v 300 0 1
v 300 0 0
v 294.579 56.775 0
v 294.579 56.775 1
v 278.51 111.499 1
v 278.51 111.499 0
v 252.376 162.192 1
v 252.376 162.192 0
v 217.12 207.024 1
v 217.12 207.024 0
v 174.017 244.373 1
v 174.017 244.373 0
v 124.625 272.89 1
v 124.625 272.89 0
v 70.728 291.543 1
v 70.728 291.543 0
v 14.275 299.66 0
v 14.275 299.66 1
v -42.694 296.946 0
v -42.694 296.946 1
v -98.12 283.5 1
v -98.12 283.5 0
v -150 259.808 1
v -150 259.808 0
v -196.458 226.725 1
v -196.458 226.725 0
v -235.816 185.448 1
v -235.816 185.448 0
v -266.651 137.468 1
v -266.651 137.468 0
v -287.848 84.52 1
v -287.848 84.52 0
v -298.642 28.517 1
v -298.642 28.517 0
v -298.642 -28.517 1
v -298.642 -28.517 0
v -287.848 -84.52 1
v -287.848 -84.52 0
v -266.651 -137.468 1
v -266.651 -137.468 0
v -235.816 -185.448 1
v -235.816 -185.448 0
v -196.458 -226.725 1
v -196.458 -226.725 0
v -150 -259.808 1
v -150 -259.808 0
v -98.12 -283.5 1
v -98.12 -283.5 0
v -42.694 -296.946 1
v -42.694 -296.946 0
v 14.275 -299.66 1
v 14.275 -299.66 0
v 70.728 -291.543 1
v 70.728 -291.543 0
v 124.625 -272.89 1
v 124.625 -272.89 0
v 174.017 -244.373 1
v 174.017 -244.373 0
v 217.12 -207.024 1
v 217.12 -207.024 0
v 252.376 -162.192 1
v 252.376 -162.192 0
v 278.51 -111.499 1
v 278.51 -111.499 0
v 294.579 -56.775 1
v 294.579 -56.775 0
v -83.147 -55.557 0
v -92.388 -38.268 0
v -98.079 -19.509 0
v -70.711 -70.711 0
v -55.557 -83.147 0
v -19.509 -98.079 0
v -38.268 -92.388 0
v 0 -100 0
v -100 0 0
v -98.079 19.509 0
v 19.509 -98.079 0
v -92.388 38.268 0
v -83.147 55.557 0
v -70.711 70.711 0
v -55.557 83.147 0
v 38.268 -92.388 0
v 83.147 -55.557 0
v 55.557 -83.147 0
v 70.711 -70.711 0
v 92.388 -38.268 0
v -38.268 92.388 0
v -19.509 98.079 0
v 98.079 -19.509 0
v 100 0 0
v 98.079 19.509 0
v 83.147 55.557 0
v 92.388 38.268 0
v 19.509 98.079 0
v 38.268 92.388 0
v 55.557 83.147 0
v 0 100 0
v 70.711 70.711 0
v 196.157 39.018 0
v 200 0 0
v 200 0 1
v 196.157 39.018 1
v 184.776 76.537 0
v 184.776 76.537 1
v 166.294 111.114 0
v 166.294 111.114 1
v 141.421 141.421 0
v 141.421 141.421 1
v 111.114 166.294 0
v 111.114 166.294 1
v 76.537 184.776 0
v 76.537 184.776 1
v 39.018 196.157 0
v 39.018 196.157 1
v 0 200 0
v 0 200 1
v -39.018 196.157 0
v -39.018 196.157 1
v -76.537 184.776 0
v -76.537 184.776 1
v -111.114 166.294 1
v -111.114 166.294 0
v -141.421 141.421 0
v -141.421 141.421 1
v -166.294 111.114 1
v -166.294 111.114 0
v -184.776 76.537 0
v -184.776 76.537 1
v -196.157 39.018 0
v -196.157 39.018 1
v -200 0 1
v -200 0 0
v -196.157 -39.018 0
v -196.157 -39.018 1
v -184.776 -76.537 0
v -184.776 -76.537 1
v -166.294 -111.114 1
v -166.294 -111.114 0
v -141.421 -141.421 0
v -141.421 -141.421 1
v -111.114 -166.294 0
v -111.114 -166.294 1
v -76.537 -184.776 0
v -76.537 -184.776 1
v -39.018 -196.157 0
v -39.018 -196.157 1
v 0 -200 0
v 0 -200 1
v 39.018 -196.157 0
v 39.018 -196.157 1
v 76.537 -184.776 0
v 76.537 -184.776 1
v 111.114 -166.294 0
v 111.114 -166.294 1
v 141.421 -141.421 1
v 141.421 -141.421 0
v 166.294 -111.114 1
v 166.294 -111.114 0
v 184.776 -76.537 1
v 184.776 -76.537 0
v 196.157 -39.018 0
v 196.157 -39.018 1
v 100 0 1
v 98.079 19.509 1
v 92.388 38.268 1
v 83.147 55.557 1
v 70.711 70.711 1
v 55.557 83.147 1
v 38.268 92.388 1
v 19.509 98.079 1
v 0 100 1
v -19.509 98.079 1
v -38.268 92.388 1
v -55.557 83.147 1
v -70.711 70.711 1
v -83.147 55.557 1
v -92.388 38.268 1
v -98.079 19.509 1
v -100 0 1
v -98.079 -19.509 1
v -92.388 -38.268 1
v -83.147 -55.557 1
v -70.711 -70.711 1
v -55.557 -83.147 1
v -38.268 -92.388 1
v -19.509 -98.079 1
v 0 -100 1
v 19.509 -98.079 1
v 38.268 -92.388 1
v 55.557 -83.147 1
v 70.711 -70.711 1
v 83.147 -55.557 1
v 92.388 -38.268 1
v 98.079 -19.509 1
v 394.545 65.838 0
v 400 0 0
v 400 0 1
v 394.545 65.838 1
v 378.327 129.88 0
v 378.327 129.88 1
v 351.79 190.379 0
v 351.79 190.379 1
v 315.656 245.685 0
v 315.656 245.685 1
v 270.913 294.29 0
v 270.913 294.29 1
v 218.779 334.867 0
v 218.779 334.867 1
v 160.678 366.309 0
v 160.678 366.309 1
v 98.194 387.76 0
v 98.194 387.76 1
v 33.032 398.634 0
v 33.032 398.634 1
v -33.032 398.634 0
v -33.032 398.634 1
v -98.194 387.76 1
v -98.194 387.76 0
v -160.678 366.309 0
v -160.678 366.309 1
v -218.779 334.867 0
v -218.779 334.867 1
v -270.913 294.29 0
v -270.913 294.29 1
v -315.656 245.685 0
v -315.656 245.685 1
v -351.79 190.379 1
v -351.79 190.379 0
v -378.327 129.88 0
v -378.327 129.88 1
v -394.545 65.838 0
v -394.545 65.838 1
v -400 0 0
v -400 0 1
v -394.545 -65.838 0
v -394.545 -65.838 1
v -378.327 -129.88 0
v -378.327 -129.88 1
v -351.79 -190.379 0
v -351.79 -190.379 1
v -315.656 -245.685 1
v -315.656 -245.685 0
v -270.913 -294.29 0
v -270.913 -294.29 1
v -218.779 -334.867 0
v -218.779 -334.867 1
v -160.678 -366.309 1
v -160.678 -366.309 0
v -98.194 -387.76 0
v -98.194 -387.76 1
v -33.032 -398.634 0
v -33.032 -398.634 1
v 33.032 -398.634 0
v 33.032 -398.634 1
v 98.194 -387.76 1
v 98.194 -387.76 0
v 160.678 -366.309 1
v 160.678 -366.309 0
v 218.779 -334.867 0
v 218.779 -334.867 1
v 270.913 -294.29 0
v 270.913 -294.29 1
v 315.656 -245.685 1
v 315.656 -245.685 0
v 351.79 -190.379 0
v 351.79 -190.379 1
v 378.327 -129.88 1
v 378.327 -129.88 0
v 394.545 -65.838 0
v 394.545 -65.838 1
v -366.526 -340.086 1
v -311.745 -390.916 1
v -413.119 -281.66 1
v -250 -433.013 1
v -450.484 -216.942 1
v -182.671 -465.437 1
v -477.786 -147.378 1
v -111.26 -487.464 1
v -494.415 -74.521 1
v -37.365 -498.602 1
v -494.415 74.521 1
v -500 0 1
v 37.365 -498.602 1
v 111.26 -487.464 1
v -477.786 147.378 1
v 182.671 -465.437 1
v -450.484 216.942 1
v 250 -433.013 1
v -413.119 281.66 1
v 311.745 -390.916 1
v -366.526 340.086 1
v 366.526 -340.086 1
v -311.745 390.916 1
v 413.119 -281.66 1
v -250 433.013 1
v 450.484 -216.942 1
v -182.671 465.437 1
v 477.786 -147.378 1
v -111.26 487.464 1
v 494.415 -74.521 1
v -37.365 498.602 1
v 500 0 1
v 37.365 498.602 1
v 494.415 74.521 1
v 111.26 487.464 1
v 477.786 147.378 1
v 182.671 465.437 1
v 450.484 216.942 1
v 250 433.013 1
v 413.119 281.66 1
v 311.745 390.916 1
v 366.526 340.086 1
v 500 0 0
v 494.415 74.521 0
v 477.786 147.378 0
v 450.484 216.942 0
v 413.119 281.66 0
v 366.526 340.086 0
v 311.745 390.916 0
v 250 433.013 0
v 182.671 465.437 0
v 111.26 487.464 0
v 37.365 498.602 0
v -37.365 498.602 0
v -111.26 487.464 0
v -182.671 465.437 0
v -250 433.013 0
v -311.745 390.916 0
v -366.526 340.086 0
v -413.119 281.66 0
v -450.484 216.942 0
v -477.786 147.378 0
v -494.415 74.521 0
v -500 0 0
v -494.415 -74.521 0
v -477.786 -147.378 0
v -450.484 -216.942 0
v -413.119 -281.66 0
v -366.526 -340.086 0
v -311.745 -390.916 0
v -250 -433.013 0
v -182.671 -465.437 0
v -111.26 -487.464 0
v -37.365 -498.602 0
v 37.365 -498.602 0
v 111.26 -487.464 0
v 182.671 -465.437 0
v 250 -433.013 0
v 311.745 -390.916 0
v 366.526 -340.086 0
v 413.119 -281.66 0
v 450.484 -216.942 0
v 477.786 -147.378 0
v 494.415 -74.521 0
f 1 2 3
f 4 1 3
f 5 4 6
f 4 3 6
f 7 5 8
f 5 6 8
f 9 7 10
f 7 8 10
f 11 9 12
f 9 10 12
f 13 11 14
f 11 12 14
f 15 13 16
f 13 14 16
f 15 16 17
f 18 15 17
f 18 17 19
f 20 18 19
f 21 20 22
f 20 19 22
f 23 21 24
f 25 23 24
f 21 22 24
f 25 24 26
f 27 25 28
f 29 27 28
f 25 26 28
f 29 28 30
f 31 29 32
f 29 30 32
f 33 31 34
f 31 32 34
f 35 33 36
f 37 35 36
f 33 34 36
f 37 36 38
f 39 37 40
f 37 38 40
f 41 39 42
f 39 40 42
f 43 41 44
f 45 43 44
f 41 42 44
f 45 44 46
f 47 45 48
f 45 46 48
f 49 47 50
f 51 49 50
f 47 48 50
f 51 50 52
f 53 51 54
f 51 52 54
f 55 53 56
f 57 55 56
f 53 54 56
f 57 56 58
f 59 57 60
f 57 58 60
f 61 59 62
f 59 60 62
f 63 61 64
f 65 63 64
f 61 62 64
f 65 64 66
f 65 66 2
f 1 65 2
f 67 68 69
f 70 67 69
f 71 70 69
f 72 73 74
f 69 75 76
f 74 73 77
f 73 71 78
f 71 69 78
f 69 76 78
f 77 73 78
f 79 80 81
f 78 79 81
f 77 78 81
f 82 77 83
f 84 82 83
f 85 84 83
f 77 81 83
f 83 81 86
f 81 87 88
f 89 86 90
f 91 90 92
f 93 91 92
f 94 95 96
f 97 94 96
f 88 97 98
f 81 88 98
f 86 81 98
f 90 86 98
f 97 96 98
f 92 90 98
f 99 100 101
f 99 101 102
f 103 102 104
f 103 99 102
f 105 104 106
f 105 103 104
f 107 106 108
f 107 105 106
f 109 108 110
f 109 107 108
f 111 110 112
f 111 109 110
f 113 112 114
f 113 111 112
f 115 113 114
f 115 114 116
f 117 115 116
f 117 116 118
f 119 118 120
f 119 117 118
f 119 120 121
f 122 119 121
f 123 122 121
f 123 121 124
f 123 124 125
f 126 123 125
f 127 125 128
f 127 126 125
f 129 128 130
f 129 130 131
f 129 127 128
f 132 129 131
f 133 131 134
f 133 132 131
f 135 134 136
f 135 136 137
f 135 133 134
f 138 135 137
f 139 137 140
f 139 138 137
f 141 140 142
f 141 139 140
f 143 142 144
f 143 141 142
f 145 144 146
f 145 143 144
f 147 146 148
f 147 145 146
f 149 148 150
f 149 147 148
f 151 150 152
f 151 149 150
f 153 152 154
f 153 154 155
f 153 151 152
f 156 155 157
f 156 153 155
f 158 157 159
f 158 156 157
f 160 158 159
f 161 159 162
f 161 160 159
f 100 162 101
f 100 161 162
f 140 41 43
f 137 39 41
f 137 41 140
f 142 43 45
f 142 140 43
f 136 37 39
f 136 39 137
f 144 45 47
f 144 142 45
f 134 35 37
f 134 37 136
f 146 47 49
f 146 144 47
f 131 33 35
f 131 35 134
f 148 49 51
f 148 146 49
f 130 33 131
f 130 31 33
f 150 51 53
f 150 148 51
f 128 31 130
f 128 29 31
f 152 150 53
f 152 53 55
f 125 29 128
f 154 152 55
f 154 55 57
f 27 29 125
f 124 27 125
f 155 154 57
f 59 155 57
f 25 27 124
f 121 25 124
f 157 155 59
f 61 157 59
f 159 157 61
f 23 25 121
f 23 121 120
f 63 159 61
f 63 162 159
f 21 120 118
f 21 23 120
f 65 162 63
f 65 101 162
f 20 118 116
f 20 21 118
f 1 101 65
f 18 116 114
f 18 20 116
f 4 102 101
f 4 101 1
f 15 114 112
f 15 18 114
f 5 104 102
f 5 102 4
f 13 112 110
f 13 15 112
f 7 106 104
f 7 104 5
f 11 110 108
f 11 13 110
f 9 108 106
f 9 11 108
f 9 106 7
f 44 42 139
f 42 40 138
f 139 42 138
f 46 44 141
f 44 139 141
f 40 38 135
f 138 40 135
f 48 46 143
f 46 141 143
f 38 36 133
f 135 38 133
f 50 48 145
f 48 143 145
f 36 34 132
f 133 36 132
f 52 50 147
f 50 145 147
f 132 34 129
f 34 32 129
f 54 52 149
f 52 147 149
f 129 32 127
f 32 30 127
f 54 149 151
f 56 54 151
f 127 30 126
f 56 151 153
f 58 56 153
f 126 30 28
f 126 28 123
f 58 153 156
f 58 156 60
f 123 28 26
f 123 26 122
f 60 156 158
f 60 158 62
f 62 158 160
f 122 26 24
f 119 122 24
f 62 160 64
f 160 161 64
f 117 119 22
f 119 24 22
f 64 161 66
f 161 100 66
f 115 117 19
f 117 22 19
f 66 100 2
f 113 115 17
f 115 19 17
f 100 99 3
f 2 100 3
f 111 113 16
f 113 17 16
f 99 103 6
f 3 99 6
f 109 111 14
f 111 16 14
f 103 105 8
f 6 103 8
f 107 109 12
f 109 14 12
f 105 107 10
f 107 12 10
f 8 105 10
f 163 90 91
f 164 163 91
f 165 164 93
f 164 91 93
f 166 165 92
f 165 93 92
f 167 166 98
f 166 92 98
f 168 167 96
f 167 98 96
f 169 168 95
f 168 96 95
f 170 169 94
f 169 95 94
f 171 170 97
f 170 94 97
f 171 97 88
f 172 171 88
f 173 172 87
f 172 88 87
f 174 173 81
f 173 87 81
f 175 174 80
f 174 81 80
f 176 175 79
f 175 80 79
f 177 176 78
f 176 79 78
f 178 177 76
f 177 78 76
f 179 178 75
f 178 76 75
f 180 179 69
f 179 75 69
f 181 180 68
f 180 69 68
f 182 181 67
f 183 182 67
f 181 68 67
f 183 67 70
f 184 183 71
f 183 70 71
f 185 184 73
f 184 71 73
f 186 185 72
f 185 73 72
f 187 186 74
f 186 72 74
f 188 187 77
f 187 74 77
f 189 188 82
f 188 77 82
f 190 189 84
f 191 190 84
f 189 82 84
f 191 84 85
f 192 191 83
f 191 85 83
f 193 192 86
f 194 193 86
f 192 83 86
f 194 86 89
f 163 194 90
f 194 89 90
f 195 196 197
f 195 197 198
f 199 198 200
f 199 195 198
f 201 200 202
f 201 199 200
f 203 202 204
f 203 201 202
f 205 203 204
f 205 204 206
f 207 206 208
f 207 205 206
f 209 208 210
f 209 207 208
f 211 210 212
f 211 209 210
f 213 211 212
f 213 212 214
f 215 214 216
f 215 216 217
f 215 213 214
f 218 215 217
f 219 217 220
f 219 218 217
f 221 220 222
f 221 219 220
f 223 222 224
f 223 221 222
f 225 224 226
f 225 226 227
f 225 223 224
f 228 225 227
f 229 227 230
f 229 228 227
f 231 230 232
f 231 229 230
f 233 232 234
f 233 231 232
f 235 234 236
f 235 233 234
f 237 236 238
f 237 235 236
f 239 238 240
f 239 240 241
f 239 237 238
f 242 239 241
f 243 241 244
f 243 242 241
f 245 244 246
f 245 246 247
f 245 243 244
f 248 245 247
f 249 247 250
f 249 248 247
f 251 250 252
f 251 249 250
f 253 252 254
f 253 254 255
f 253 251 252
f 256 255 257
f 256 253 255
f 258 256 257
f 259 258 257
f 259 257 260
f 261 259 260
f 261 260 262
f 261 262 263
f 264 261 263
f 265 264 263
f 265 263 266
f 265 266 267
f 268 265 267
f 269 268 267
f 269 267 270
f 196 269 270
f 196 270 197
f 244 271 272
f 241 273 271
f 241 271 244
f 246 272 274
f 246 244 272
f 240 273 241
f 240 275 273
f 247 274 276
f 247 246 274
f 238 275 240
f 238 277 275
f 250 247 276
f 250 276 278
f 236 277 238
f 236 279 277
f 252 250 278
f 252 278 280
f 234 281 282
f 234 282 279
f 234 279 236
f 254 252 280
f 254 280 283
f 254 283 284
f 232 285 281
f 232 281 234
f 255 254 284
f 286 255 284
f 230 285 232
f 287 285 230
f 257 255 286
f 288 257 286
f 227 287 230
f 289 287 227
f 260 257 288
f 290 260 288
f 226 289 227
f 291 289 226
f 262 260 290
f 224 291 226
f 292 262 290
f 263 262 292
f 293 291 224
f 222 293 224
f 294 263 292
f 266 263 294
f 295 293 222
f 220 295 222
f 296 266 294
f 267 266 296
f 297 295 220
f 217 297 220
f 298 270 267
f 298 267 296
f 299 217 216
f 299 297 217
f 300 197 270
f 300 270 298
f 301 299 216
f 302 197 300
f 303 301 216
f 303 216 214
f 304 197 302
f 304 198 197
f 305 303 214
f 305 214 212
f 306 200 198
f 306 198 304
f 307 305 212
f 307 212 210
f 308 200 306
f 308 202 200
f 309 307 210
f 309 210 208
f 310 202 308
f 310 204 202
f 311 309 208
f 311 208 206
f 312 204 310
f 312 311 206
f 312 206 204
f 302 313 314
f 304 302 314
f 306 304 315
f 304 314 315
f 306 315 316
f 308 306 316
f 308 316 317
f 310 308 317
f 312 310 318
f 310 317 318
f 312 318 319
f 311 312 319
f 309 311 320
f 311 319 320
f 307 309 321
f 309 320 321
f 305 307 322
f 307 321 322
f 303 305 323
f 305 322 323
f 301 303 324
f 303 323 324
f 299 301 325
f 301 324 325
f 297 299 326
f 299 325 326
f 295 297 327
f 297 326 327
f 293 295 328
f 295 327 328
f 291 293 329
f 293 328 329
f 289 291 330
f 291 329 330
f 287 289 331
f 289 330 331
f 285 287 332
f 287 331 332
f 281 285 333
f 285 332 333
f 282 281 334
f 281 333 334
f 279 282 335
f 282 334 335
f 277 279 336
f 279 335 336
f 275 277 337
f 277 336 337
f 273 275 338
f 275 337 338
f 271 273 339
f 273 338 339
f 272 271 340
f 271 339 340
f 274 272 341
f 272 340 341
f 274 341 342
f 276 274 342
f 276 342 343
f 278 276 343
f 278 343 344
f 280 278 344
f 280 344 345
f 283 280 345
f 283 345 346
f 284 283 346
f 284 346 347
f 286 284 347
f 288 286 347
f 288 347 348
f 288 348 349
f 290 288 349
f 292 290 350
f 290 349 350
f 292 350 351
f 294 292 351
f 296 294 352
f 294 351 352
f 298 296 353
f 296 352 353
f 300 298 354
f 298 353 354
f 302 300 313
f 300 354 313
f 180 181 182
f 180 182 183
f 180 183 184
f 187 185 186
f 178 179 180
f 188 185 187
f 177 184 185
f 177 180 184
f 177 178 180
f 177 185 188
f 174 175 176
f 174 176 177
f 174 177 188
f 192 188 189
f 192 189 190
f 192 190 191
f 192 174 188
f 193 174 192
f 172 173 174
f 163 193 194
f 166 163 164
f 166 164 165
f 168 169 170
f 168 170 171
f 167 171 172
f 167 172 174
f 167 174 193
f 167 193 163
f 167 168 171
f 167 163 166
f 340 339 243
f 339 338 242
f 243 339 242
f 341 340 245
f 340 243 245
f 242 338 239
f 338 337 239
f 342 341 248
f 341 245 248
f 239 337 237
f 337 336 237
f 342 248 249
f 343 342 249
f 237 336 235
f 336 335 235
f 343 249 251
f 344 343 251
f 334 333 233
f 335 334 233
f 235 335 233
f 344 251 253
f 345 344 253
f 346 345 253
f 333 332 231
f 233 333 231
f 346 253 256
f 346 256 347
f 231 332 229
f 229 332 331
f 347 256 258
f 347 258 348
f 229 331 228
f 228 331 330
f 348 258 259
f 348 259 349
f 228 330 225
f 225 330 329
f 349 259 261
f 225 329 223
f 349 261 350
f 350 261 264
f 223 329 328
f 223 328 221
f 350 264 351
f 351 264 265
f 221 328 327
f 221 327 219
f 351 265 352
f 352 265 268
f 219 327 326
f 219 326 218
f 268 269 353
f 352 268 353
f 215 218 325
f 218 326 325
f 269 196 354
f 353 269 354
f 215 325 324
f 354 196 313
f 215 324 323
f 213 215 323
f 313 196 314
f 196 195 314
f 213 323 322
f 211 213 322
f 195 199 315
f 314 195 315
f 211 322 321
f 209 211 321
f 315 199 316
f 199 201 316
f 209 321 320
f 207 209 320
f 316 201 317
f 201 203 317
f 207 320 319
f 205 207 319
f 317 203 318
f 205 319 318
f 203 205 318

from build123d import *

# Parameters (mm, degrees)
F0_R     = 500
F0_R_2   = 400
F1_DEPTH = 1
F2_R     = 300
F2_R_2   = 200
F3_DEPTH = 1
F4_R     = 100
F5_DEPTH = 1


with BuildPart() as f1:
    # F0 (on Top) → F1 (new body)
    with BuildSketch(Plane.XY):
        Circle(F0_R)
        Circle(F0_R_2, mode=Mode.SUBTRACT)
    extrude(amount=F1_DEPTH)


with BuildPart() as f3:
    # F2 (on Top) → F3 (new body)
    with BuildSketch(Plane.XY):
        Circle(F2_R)
        Circle(F2_R_2, mode=Mode.SUBTRACT)
    extrude(amount=F3_DEPTH)


with BuildPart() as f5:
    # F4 (on Top) → F5 (new body)
    with BuildSketch(Plane.XY):
        Circle(F4_R)
    extrude(amount=F5_DEPTH)


solid = Compound([f1.part, f3.part, f5.part])
